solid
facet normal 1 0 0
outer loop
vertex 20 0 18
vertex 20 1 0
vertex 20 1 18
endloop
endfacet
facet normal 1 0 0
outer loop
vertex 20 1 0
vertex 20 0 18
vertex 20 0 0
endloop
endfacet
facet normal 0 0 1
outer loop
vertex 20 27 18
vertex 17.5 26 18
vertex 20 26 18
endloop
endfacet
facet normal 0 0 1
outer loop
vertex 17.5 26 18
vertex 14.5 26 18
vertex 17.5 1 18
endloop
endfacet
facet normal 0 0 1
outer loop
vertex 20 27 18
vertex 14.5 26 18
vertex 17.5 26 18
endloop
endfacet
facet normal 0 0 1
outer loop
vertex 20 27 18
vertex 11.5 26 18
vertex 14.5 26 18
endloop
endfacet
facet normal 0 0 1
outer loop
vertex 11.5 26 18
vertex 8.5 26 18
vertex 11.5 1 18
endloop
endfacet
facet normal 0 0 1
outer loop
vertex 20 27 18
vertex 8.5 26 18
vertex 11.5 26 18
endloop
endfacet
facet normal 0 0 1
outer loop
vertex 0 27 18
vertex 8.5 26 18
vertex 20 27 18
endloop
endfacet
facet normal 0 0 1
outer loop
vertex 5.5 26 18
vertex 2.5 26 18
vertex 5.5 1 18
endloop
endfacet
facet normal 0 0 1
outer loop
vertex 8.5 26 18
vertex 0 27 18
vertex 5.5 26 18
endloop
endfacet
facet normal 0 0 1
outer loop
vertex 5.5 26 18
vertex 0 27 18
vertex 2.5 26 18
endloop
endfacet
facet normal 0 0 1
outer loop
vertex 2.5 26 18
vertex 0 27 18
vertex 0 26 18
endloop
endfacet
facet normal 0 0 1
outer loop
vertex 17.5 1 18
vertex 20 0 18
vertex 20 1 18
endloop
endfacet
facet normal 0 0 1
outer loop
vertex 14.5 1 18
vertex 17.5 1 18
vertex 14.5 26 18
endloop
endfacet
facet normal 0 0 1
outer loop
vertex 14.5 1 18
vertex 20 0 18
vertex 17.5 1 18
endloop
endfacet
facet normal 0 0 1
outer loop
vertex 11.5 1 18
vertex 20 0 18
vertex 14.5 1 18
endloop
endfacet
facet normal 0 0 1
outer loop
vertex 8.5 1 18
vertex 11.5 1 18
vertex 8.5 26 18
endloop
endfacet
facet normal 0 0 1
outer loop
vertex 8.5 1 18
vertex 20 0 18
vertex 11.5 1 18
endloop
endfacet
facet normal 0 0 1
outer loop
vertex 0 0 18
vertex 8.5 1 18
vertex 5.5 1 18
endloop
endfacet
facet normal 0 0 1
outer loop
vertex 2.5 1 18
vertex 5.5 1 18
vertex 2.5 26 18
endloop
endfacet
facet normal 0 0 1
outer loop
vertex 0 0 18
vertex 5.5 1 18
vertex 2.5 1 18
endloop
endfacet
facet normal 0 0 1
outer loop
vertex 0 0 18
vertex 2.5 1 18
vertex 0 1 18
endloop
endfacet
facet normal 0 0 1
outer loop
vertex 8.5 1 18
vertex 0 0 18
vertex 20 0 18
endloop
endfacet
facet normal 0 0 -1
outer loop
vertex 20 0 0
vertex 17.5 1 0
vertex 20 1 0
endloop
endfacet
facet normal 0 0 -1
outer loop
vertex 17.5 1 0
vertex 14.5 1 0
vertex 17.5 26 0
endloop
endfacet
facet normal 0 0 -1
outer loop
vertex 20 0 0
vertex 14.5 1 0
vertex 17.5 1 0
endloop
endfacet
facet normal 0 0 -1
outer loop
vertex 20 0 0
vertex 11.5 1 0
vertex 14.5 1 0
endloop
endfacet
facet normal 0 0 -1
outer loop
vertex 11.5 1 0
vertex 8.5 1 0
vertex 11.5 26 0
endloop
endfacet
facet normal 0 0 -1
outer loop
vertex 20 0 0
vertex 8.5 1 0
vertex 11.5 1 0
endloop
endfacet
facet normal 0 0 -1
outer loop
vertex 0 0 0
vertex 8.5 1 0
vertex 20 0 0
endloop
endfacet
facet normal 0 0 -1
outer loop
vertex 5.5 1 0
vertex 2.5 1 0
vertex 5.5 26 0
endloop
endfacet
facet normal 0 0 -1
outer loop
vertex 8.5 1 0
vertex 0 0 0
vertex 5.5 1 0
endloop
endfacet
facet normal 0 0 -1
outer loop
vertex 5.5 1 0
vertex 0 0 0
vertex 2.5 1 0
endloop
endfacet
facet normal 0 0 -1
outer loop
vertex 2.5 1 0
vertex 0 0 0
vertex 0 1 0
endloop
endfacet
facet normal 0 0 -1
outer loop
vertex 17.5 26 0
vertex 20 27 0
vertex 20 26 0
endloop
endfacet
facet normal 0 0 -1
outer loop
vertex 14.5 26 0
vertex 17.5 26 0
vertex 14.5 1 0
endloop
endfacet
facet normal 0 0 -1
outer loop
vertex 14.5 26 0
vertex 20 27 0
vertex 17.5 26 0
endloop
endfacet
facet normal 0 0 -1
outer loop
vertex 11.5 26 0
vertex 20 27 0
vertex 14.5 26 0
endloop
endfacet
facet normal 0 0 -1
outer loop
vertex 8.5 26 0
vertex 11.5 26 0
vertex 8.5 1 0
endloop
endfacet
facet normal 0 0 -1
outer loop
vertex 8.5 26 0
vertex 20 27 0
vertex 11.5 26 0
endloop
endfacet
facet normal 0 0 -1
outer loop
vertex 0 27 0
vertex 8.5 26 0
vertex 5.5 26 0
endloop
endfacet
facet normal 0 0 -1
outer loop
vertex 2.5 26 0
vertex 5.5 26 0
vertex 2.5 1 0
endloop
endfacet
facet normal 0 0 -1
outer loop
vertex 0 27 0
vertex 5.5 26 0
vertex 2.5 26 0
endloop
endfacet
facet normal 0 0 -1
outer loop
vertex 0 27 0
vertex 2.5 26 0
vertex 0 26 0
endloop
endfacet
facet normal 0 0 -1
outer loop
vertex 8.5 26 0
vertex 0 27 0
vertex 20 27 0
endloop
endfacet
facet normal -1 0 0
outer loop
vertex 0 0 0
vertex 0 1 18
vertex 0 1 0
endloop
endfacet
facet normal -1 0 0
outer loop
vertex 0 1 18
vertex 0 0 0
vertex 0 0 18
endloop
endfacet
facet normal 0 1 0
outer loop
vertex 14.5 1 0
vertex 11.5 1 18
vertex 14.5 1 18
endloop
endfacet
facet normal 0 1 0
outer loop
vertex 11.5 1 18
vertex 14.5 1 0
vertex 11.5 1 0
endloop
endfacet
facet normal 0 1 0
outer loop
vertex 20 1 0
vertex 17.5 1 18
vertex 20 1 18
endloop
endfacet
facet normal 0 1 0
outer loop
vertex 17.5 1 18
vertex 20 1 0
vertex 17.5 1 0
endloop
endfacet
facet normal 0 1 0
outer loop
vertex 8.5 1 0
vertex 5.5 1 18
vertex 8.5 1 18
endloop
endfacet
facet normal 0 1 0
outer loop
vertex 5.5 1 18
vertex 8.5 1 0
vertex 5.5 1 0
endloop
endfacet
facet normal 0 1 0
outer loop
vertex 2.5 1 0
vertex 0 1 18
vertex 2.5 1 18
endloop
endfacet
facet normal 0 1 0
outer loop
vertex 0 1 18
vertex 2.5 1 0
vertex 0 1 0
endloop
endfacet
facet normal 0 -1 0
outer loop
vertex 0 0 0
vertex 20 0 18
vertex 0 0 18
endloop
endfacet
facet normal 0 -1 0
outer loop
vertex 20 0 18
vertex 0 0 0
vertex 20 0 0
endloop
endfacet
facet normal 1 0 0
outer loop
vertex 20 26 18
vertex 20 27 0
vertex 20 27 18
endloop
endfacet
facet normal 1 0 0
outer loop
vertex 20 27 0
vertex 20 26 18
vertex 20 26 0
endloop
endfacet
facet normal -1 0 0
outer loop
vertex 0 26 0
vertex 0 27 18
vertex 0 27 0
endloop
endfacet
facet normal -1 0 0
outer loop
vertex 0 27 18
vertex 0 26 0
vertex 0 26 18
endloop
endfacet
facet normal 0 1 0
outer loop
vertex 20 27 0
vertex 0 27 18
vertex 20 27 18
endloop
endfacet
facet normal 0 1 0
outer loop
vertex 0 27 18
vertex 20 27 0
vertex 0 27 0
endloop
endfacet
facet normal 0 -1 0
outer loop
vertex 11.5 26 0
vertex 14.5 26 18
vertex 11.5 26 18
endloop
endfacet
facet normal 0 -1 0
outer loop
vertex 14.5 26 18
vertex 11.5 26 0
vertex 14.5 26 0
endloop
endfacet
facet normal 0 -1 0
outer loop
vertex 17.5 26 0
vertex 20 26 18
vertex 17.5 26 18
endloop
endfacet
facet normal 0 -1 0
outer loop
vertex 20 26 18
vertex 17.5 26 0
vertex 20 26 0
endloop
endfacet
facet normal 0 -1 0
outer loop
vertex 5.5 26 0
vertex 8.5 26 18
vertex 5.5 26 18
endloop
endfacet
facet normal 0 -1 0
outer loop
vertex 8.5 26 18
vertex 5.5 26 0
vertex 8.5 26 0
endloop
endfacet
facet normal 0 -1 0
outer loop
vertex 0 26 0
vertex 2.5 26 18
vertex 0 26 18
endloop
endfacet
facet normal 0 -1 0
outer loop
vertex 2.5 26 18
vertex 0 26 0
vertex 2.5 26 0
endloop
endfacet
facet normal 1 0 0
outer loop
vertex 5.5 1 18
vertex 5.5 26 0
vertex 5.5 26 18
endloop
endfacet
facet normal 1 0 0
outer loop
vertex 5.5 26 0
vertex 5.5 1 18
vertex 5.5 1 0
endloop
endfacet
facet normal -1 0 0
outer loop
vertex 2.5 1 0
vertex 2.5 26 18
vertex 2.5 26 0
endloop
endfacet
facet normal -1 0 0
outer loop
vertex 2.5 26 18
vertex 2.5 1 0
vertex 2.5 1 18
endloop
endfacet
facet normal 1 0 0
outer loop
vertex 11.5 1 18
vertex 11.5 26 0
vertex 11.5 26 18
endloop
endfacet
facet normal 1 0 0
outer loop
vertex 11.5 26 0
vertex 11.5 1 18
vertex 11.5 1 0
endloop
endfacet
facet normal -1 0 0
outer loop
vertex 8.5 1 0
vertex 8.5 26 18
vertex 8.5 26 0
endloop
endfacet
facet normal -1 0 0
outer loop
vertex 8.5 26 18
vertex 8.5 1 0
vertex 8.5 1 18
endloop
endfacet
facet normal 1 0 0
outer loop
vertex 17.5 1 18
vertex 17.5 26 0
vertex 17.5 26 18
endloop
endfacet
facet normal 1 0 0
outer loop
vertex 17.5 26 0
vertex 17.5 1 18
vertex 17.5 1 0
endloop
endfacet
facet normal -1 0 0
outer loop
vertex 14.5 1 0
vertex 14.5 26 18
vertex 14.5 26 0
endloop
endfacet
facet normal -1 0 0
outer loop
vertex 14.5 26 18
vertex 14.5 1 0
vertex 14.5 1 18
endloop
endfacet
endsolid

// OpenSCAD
outerWidth = 20;
outerDepth = 1;
connectorWidth = 3;
connectorDepth = 25;
height = 18;
innerHoleWidth = 3;
outerHoleWidth = (outerWidth - (3*connectorWidth + 2*innerHoleWidth))/2;

outerWall = [outerWidth, outerDepth, height];
connector = [connectorWidth, connectorDepth, height];

// top wall
cube(outerWall);

// bottom wall
translate([0, outerDepth + connectorDepth, 0])
cube(outerWall);

// connector 1
translate([outerHoleWidth, outerDepth, 0])
cube(connector);

// connector 2
translate([outerHoleWidth + connectorWidth + innerHoleWidth, outerDepth, 0])
cube(connector);

// connector 1
translate([outerHoleWidth + 2*connectorWidth + 2*innerHoleWidth, outerDepth, 0])
cube(connector);
